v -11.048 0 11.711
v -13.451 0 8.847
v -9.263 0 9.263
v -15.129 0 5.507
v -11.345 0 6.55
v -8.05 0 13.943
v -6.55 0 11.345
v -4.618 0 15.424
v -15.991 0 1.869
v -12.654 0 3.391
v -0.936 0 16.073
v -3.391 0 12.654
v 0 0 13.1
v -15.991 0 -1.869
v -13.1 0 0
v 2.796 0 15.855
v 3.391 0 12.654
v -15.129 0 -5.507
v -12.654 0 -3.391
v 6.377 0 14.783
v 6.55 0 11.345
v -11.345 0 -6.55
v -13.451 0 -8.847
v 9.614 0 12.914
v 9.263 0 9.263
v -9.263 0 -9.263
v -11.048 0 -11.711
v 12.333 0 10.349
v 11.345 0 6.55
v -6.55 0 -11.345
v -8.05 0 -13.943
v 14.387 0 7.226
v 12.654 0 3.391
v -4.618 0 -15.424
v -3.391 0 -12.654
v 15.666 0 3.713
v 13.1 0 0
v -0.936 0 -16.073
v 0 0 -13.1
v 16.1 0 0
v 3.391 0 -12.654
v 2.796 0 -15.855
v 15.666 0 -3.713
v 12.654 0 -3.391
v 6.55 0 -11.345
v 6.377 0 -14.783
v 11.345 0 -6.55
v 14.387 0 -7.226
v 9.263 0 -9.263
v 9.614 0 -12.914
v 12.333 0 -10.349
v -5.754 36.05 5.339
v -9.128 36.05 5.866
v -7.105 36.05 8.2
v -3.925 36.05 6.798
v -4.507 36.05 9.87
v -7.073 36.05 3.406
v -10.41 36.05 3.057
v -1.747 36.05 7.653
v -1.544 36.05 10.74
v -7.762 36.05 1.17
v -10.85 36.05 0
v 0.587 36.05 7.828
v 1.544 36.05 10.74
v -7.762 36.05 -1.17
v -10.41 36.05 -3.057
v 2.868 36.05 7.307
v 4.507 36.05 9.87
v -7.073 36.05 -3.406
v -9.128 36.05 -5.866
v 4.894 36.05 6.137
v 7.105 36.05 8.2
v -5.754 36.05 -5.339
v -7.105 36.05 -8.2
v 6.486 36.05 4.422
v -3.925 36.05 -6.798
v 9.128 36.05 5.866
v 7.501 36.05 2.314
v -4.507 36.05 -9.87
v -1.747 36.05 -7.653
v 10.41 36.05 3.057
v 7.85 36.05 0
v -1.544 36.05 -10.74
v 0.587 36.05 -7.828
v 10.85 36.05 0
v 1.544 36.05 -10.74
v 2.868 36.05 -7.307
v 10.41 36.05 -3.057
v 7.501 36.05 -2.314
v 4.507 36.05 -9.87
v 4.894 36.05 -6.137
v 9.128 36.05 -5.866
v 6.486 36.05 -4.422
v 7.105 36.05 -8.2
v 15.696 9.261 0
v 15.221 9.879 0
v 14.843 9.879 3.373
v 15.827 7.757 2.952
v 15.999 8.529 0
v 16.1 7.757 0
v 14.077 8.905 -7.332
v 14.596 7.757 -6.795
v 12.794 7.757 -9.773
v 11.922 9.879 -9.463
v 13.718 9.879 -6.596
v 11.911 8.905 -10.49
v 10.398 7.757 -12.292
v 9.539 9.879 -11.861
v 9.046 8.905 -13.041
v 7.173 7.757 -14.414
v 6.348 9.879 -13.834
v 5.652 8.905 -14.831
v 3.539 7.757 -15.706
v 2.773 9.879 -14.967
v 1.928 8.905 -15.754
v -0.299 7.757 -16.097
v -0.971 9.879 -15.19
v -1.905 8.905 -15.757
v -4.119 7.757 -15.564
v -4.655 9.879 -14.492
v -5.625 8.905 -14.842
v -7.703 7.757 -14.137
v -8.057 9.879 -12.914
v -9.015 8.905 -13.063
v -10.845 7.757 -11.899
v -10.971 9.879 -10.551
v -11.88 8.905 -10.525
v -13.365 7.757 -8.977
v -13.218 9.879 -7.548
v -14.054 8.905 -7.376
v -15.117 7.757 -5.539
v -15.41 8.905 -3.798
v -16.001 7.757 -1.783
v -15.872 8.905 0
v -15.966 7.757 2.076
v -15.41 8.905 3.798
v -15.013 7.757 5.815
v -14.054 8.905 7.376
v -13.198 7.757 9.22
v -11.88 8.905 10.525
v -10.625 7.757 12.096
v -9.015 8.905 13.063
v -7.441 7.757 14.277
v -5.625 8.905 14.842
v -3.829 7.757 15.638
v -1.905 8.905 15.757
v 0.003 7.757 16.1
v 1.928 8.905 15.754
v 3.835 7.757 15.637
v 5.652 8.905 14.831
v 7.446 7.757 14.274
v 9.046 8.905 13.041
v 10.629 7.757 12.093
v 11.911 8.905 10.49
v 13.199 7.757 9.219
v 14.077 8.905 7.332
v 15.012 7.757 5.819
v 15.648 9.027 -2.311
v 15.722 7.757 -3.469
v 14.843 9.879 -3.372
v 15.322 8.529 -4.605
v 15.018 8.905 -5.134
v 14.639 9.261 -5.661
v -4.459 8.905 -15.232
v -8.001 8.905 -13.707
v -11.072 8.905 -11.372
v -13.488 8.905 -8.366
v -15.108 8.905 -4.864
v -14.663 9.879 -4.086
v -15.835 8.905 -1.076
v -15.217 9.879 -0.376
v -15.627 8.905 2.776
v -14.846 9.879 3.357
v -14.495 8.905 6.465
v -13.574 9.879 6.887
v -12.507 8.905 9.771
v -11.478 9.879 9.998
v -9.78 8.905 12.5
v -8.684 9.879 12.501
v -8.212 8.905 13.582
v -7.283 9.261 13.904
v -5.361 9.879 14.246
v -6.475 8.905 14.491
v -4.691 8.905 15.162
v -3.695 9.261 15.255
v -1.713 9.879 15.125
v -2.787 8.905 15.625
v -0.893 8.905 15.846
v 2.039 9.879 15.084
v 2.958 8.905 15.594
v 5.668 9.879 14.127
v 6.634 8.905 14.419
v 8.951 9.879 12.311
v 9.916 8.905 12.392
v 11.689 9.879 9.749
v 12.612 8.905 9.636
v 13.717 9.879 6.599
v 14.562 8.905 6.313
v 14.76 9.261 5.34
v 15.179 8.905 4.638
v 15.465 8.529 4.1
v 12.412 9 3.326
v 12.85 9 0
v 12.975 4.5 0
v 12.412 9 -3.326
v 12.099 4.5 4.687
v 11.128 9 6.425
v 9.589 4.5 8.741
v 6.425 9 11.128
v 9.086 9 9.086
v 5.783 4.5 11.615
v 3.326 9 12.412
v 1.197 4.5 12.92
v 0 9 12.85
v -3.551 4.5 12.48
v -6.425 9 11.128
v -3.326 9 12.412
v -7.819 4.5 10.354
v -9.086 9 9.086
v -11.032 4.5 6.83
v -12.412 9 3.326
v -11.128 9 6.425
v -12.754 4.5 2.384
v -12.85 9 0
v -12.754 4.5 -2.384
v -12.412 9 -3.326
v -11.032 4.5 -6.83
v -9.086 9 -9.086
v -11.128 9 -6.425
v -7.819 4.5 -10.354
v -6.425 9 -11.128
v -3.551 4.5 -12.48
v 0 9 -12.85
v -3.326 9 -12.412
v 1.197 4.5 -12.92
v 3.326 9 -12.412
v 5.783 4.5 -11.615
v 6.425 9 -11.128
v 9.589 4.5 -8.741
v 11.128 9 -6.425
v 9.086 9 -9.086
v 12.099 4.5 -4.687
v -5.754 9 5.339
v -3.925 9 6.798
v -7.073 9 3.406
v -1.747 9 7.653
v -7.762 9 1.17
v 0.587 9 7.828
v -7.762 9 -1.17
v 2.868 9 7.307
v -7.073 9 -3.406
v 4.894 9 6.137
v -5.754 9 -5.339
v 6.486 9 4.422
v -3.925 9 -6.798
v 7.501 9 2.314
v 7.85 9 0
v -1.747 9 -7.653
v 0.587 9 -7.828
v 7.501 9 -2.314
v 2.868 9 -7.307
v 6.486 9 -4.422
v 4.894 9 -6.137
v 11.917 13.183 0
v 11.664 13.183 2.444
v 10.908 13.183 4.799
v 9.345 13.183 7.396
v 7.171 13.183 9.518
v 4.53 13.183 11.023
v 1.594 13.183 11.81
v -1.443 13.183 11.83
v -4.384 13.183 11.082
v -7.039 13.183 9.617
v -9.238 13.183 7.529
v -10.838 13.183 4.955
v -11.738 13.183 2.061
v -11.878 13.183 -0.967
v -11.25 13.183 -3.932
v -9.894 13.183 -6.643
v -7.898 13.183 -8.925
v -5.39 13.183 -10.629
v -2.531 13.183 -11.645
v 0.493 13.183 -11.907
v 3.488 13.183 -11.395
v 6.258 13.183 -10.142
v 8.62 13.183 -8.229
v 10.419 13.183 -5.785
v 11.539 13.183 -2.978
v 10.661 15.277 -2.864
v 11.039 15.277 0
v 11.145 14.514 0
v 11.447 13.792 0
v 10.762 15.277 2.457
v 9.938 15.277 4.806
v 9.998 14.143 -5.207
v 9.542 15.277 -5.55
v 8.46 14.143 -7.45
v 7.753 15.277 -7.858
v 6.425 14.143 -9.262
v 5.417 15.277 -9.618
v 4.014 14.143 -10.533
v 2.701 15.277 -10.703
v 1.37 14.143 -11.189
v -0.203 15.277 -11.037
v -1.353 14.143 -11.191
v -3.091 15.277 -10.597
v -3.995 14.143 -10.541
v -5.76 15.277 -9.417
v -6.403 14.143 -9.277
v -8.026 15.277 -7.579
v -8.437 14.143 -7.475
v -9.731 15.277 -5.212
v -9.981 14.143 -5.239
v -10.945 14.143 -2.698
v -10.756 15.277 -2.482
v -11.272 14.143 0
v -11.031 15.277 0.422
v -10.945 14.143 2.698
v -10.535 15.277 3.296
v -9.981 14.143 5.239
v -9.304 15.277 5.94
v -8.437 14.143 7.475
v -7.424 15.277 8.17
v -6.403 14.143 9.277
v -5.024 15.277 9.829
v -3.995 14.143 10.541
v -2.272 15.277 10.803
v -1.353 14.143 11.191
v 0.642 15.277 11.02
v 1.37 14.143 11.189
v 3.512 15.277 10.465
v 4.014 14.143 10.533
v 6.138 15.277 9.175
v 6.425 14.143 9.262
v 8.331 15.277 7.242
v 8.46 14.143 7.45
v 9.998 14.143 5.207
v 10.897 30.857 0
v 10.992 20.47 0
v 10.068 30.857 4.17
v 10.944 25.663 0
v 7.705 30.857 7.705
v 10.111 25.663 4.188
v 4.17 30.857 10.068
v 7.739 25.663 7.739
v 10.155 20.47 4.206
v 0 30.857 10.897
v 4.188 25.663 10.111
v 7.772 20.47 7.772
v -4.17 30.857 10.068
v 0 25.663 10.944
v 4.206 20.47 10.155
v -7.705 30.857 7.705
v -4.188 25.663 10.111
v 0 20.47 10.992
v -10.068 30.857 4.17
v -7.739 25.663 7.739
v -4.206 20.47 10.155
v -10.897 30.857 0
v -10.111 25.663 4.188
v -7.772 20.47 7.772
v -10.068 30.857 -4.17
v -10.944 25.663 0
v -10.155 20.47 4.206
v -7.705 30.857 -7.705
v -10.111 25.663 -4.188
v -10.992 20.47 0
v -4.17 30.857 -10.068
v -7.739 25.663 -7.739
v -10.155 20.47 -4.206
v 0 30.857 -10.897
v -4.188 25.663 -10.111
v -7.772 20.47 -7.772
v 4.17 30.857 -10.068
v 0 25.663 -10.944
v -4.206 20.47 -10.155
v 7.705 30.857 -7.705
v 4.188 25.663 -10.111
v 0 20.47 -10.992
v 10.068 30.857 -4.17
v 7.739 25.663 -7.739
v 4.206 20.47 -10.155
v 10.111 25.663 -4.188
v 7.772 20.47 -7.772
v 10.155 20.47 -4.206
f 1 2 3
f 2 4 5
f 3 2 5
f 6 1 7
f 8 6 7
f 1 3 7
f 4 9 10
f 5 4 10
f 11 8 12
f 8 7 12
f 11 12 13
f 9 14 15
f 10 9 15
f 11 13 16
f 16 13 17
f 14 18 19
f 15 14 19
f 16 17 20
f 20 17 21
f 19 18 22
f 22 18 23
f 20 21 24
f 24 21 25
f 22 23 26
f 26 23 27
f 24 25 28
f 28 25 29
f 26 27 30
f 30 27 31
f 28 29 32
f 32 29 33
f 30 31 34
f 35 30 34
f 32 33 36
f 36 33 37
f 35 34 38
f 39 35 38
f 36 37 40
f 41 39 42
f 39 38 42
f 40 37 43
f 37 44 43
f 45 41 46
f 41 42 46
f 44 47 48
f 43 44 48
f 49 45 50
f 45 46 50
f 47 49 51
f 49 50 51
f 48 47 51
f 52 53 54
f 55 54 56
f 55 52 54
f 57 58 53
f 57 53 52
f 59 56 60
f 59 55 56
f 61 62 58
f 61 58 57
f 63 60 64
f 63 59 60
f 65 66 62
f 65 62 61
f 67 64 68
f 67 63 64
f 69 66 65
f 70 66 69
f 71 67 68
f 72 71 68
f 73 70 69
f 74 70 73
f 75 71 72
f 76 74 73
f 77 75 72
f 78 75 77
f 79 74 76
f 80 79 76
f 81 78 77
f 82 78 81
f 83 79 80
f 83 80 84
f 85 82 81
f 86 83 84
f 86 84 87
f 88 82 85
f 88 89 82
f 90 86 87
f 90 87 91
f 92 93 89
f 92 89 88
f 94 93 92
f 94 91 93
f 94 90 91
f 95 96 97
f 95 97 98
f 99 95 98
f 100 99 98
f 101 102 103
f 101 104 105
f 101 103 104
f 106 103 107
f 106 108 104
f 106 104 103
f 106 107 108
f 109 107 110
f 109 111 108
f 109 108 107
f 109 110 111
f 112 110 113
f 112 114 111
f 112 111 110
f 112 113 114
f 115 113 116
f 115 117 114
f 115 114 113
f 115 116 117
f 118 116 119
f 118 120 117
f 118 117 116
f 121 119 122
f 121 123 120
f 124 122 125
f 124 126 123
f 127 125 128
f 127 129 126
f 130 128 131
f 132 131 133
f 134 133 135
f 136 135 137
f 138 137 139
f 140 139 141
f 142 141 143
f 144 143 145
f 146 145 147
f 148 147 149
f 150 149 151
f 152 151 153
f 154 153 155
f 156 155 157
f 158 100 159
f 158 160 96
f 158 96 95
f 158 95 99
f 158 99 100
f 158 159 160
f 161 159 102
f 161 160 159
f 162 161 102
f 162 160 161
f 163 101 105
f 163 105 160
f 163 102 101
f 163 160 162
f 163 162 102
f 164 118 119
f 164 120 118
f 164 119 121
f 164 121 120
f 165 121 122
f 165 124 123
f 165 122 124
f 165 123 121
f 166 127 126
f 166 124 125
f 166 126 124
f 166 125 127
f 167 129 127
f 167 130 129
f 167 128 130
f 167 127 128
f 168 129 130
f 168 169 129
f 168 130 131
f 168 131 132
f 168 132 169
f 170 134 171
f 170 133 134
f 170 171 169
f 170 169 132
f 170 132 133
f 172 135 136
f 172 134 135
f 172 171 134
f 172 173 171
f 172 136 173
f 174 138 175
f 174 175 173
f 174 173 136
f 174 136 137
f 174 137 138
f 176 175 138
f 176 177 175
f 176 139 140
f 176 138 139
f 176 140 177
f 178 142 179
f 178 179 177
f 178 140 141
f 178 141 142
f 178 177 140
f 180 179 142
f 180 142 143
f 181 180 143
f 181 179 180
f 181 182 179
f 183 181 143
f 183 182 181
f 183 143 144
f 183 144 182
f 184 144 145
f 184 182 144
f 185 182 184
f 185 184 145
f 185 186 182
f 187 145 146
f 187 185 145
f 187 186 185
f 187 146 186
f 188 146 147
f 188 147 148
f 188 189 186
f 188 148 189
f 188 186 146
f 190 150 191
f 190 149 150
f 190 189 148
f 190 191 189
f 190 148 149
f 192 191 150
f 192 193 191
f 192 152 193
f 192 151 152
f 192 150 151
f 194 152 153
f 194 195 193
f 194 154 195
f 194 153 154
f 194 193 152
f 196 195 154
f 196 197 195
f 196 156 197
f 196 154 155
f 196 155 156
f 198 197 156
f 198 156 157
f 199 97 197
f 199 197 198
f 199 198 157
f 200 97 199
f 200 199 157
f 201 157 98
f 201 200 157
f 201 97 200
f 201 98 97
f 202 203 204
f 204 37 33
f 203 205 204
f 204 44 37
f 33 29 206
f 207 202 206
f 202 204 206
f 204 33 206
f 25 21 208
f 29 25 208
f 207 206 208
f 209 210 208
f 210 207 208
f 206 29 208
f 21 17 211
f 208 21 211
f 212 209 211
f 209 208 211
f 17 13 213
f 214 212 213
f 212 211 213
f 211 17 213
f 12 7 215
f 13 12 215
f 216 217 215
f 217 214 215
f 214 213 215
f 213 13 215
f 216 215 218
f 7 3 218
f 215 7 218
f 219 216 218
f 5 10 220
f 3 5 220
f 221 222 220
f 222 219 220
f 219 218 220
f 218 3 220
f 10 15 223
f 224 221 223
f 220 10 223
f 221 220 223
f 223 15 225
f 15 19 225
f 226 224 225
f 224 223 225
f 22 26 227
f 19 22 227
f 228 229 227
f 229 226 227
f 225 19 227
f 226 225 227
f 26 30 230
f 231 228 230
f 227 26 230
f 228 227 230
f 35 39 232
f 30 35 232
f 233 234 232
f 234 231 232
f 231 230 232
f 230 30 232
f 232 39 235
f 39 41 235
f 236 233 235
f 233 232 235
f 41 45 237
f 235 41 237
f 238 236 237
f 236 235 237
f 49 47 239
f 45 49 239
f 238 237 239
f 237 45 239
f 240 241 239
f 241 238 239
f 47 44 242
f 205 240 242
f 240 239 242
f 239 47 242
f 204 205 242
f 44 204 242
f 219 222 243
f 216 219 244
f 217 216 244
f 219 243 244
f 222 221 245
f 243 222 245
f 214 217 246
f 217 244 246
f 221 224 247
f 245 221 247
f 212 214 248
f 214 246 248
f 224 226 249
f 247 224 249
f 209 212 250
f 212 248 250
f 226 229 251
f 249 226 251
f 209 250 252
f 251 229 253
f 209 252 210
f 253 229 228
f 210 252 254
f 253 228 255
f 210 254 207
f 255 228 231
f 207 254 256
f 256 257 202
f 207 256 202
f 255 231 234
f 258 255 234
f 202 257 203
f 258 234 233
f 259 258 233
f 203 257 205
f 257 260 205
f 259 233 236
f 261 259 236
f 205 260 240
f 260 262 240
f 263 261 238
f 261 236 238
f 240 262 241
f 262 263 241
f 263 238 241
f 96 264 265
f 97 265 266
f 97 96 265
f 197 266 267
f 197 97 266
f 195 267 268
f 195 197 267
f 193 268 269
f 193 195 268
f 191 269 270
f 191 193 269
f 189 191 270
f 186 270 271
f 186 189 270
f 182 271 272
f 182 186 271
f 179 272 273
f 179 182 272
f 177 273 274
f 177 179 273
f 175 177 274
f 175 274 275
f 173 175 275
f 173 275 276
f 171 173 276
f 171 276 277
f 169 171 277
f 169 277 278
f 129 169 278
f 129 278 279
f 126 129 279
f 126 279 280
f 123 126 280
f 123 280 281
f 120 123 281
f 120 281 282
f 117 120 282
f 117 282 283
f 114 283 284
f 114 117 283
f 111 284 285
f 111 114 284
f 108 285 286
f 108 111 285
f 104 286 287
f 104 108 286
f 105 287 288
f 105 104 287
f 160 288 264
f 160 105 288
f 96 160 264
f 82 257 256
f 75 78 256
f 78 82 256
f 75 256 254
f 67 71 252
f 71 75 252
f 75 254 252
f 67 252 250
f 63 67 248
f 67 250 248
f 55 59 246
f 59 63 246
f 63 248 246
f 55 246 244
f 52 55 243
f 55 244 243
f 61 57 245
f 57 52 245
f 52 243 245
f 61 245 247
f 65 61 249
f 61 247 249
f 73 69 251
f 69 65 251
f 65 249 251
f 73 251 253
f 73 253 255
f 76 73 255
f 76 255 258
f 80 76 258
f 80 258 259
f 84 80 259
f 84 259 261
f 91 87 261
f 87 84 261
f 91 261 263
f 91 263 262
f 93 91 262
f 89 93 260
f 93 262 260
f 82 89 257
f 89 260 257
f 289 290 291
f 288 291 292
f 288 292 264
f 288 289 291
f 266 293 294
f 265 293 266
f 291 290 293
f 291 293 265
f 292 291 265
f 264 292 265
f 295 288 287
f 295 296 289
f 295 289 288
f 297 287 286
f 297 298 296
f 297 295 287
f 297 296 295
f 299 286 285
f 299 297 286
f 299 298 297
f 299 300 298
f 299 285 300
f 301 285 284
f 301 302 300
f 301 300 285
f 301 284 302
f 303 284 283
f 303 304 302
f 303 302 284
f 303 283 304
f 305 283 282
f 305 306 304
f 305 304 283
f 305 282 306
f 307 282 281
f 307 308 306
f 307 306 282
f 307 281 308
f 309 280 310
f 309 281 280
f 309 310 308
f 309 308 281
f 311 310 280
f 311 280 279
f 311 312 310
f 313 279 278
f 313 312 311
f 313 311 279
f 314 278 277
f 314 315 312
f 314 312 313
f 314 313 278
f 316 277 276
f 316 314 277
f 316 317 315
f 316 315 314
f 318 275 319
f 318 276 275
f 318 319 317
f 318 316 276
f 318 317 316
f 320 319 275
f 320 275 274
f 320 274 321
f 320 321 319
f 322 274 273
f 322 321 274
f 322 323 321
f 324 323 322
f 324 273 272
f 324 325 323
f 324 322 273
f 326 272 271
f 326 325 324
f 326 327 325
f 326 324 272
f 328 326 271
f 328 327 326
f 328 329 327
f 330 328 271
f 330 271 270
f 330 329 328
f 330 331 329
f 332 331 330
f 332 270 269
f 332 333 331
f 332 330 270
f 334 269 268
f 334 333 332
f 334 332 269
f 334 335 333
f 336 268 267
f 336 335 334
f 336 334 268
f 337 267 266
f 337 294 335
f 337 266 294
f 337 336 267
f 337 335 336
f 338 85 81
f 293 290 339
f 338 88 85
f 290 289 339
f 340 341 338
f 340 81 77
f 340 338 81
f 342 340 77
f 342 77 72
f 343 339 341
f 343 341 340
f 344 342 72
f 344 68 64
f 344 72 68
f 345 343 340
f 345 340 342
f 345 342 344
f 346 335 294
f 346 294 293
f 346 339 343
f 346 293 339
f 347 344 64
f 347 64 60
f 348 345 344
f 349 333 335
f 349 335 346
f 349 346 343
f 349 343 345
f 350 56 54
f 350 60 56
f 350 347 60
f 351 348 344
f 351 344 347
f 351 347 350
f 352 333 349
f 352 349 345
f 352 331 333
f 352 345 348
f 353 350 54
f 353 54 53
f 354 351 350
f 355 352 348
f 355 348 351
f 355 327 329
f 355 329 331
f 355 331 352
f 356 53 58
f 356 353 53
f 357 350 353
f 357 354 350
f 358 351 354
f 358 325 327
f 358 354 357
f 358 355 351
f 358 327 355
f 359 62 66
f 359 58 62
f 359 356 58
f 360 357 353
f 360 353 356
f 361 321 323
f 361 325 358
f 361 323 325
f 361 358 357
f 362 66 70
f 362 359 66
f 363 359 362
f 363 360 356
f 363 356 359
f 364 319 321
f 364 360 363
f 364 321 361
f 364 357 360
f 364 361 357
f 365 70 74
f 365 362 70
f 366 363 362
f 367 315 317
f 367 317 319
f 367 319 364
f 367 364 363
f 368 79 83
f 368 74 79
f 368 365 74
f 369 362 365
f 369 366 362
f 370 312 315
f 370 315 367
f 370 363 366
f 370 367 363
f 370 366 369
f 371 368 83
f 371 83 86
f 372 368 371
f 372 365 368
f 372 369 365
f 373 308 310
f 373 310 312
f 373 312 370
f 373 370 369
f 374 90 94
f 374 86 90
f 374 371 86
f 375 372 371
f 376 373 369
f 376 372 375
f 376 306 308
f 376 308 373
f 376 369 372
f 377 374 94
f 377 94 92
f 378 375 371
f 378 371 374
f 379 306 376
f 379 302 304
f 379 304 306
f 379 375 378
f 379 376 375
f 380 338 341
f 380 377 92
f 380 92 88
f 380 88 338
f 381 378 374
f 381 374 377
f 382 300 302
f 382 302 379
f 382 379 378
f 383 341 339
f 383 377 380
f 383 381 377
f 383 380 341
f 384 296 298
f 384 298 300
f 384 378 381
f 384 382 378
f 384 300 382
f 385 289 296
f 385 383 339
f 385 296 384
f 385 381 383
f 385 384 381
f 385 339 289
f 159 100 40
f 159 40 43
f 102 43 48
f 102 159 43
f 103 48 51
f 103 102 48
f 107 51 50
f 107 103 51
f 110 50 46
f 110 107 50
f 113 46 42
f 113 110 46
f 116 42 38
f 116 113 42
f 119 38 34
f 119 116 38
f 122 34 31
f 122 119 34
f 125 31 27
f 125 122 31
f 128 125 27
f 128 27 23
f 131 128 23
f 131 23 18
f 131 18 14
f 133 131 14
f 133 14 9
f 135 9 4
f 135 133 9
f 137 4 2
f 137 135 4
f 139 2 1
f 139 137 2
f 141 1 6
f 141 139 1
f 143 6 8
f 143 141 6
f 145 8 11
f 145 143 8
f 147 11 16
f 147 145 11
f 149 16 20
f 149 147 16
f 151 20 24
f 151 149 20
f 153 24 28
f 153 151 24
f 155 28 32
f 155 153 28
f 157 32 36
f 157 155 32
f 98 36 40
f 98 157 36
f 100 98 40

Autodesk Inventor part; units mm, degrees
ref_plane "YZ Plane" through (0, 0, 0) normal (1, 0, 0) x (0, 1, 0)
ref_plane "XZ Plane" through (0, 0, 0) normal (0, 1, 0) x (-1, 0, 0)
ref_plane "XY Plane" through (0, 0, 0) normal (0, 0, 1) x (1, 0, 0)
sketch "Sketch2" plane through (0, 0, 0) normal (0, 0, 1) x (1, 0, 0)
  line L0 (12.85, 9) -> (13.1, 0)
  line L1 (0, 0) -> (13.1, 0) construction
  line L2 (0, 9) -> (12.85, 9) construction
  line L3 (0, 0) -> (0, 9) construction
  line L4 (16.1, 0) -> (16.1, 9)
  line L5 (16.1, 9) -> (11.05, 14.05)
  line L6 (11.05, 14.05) -> (10.85, 36.05)
  line L7 (10.85, 36.05) -> (7.85, 36.05)
  line L8 (7.85, 36.05) -> (7.85, 9)
  line L9 (7.85, 9) -> (12.85, 9)
  line L10 (13.1, 0) -> (16.1, 0)
  line L11 (0, -7.21) -> (0, 43.26) projected
  dimension "d0" = 13.1
  dimension "d1" = 12.85
  dimension "d2" = 9
  dimension "d3" = 3
  dimension "d4" = 45
  dimension "d5" = 11.05
  dimension "d6" = 22
  dimension "d7" = 10.85
  dimension "d8" = 3
revolve "Revolution1" add sketch "Sketch2" angle 360 about axis through (0, -10, 0) along (0, 1, 0)
fillet "Fillet2" radius 3 2 edges at (-11.05, 14.05, 0) (-16.1, 9, 0)
properties part number "BlowerInletPort_3DPrint"
